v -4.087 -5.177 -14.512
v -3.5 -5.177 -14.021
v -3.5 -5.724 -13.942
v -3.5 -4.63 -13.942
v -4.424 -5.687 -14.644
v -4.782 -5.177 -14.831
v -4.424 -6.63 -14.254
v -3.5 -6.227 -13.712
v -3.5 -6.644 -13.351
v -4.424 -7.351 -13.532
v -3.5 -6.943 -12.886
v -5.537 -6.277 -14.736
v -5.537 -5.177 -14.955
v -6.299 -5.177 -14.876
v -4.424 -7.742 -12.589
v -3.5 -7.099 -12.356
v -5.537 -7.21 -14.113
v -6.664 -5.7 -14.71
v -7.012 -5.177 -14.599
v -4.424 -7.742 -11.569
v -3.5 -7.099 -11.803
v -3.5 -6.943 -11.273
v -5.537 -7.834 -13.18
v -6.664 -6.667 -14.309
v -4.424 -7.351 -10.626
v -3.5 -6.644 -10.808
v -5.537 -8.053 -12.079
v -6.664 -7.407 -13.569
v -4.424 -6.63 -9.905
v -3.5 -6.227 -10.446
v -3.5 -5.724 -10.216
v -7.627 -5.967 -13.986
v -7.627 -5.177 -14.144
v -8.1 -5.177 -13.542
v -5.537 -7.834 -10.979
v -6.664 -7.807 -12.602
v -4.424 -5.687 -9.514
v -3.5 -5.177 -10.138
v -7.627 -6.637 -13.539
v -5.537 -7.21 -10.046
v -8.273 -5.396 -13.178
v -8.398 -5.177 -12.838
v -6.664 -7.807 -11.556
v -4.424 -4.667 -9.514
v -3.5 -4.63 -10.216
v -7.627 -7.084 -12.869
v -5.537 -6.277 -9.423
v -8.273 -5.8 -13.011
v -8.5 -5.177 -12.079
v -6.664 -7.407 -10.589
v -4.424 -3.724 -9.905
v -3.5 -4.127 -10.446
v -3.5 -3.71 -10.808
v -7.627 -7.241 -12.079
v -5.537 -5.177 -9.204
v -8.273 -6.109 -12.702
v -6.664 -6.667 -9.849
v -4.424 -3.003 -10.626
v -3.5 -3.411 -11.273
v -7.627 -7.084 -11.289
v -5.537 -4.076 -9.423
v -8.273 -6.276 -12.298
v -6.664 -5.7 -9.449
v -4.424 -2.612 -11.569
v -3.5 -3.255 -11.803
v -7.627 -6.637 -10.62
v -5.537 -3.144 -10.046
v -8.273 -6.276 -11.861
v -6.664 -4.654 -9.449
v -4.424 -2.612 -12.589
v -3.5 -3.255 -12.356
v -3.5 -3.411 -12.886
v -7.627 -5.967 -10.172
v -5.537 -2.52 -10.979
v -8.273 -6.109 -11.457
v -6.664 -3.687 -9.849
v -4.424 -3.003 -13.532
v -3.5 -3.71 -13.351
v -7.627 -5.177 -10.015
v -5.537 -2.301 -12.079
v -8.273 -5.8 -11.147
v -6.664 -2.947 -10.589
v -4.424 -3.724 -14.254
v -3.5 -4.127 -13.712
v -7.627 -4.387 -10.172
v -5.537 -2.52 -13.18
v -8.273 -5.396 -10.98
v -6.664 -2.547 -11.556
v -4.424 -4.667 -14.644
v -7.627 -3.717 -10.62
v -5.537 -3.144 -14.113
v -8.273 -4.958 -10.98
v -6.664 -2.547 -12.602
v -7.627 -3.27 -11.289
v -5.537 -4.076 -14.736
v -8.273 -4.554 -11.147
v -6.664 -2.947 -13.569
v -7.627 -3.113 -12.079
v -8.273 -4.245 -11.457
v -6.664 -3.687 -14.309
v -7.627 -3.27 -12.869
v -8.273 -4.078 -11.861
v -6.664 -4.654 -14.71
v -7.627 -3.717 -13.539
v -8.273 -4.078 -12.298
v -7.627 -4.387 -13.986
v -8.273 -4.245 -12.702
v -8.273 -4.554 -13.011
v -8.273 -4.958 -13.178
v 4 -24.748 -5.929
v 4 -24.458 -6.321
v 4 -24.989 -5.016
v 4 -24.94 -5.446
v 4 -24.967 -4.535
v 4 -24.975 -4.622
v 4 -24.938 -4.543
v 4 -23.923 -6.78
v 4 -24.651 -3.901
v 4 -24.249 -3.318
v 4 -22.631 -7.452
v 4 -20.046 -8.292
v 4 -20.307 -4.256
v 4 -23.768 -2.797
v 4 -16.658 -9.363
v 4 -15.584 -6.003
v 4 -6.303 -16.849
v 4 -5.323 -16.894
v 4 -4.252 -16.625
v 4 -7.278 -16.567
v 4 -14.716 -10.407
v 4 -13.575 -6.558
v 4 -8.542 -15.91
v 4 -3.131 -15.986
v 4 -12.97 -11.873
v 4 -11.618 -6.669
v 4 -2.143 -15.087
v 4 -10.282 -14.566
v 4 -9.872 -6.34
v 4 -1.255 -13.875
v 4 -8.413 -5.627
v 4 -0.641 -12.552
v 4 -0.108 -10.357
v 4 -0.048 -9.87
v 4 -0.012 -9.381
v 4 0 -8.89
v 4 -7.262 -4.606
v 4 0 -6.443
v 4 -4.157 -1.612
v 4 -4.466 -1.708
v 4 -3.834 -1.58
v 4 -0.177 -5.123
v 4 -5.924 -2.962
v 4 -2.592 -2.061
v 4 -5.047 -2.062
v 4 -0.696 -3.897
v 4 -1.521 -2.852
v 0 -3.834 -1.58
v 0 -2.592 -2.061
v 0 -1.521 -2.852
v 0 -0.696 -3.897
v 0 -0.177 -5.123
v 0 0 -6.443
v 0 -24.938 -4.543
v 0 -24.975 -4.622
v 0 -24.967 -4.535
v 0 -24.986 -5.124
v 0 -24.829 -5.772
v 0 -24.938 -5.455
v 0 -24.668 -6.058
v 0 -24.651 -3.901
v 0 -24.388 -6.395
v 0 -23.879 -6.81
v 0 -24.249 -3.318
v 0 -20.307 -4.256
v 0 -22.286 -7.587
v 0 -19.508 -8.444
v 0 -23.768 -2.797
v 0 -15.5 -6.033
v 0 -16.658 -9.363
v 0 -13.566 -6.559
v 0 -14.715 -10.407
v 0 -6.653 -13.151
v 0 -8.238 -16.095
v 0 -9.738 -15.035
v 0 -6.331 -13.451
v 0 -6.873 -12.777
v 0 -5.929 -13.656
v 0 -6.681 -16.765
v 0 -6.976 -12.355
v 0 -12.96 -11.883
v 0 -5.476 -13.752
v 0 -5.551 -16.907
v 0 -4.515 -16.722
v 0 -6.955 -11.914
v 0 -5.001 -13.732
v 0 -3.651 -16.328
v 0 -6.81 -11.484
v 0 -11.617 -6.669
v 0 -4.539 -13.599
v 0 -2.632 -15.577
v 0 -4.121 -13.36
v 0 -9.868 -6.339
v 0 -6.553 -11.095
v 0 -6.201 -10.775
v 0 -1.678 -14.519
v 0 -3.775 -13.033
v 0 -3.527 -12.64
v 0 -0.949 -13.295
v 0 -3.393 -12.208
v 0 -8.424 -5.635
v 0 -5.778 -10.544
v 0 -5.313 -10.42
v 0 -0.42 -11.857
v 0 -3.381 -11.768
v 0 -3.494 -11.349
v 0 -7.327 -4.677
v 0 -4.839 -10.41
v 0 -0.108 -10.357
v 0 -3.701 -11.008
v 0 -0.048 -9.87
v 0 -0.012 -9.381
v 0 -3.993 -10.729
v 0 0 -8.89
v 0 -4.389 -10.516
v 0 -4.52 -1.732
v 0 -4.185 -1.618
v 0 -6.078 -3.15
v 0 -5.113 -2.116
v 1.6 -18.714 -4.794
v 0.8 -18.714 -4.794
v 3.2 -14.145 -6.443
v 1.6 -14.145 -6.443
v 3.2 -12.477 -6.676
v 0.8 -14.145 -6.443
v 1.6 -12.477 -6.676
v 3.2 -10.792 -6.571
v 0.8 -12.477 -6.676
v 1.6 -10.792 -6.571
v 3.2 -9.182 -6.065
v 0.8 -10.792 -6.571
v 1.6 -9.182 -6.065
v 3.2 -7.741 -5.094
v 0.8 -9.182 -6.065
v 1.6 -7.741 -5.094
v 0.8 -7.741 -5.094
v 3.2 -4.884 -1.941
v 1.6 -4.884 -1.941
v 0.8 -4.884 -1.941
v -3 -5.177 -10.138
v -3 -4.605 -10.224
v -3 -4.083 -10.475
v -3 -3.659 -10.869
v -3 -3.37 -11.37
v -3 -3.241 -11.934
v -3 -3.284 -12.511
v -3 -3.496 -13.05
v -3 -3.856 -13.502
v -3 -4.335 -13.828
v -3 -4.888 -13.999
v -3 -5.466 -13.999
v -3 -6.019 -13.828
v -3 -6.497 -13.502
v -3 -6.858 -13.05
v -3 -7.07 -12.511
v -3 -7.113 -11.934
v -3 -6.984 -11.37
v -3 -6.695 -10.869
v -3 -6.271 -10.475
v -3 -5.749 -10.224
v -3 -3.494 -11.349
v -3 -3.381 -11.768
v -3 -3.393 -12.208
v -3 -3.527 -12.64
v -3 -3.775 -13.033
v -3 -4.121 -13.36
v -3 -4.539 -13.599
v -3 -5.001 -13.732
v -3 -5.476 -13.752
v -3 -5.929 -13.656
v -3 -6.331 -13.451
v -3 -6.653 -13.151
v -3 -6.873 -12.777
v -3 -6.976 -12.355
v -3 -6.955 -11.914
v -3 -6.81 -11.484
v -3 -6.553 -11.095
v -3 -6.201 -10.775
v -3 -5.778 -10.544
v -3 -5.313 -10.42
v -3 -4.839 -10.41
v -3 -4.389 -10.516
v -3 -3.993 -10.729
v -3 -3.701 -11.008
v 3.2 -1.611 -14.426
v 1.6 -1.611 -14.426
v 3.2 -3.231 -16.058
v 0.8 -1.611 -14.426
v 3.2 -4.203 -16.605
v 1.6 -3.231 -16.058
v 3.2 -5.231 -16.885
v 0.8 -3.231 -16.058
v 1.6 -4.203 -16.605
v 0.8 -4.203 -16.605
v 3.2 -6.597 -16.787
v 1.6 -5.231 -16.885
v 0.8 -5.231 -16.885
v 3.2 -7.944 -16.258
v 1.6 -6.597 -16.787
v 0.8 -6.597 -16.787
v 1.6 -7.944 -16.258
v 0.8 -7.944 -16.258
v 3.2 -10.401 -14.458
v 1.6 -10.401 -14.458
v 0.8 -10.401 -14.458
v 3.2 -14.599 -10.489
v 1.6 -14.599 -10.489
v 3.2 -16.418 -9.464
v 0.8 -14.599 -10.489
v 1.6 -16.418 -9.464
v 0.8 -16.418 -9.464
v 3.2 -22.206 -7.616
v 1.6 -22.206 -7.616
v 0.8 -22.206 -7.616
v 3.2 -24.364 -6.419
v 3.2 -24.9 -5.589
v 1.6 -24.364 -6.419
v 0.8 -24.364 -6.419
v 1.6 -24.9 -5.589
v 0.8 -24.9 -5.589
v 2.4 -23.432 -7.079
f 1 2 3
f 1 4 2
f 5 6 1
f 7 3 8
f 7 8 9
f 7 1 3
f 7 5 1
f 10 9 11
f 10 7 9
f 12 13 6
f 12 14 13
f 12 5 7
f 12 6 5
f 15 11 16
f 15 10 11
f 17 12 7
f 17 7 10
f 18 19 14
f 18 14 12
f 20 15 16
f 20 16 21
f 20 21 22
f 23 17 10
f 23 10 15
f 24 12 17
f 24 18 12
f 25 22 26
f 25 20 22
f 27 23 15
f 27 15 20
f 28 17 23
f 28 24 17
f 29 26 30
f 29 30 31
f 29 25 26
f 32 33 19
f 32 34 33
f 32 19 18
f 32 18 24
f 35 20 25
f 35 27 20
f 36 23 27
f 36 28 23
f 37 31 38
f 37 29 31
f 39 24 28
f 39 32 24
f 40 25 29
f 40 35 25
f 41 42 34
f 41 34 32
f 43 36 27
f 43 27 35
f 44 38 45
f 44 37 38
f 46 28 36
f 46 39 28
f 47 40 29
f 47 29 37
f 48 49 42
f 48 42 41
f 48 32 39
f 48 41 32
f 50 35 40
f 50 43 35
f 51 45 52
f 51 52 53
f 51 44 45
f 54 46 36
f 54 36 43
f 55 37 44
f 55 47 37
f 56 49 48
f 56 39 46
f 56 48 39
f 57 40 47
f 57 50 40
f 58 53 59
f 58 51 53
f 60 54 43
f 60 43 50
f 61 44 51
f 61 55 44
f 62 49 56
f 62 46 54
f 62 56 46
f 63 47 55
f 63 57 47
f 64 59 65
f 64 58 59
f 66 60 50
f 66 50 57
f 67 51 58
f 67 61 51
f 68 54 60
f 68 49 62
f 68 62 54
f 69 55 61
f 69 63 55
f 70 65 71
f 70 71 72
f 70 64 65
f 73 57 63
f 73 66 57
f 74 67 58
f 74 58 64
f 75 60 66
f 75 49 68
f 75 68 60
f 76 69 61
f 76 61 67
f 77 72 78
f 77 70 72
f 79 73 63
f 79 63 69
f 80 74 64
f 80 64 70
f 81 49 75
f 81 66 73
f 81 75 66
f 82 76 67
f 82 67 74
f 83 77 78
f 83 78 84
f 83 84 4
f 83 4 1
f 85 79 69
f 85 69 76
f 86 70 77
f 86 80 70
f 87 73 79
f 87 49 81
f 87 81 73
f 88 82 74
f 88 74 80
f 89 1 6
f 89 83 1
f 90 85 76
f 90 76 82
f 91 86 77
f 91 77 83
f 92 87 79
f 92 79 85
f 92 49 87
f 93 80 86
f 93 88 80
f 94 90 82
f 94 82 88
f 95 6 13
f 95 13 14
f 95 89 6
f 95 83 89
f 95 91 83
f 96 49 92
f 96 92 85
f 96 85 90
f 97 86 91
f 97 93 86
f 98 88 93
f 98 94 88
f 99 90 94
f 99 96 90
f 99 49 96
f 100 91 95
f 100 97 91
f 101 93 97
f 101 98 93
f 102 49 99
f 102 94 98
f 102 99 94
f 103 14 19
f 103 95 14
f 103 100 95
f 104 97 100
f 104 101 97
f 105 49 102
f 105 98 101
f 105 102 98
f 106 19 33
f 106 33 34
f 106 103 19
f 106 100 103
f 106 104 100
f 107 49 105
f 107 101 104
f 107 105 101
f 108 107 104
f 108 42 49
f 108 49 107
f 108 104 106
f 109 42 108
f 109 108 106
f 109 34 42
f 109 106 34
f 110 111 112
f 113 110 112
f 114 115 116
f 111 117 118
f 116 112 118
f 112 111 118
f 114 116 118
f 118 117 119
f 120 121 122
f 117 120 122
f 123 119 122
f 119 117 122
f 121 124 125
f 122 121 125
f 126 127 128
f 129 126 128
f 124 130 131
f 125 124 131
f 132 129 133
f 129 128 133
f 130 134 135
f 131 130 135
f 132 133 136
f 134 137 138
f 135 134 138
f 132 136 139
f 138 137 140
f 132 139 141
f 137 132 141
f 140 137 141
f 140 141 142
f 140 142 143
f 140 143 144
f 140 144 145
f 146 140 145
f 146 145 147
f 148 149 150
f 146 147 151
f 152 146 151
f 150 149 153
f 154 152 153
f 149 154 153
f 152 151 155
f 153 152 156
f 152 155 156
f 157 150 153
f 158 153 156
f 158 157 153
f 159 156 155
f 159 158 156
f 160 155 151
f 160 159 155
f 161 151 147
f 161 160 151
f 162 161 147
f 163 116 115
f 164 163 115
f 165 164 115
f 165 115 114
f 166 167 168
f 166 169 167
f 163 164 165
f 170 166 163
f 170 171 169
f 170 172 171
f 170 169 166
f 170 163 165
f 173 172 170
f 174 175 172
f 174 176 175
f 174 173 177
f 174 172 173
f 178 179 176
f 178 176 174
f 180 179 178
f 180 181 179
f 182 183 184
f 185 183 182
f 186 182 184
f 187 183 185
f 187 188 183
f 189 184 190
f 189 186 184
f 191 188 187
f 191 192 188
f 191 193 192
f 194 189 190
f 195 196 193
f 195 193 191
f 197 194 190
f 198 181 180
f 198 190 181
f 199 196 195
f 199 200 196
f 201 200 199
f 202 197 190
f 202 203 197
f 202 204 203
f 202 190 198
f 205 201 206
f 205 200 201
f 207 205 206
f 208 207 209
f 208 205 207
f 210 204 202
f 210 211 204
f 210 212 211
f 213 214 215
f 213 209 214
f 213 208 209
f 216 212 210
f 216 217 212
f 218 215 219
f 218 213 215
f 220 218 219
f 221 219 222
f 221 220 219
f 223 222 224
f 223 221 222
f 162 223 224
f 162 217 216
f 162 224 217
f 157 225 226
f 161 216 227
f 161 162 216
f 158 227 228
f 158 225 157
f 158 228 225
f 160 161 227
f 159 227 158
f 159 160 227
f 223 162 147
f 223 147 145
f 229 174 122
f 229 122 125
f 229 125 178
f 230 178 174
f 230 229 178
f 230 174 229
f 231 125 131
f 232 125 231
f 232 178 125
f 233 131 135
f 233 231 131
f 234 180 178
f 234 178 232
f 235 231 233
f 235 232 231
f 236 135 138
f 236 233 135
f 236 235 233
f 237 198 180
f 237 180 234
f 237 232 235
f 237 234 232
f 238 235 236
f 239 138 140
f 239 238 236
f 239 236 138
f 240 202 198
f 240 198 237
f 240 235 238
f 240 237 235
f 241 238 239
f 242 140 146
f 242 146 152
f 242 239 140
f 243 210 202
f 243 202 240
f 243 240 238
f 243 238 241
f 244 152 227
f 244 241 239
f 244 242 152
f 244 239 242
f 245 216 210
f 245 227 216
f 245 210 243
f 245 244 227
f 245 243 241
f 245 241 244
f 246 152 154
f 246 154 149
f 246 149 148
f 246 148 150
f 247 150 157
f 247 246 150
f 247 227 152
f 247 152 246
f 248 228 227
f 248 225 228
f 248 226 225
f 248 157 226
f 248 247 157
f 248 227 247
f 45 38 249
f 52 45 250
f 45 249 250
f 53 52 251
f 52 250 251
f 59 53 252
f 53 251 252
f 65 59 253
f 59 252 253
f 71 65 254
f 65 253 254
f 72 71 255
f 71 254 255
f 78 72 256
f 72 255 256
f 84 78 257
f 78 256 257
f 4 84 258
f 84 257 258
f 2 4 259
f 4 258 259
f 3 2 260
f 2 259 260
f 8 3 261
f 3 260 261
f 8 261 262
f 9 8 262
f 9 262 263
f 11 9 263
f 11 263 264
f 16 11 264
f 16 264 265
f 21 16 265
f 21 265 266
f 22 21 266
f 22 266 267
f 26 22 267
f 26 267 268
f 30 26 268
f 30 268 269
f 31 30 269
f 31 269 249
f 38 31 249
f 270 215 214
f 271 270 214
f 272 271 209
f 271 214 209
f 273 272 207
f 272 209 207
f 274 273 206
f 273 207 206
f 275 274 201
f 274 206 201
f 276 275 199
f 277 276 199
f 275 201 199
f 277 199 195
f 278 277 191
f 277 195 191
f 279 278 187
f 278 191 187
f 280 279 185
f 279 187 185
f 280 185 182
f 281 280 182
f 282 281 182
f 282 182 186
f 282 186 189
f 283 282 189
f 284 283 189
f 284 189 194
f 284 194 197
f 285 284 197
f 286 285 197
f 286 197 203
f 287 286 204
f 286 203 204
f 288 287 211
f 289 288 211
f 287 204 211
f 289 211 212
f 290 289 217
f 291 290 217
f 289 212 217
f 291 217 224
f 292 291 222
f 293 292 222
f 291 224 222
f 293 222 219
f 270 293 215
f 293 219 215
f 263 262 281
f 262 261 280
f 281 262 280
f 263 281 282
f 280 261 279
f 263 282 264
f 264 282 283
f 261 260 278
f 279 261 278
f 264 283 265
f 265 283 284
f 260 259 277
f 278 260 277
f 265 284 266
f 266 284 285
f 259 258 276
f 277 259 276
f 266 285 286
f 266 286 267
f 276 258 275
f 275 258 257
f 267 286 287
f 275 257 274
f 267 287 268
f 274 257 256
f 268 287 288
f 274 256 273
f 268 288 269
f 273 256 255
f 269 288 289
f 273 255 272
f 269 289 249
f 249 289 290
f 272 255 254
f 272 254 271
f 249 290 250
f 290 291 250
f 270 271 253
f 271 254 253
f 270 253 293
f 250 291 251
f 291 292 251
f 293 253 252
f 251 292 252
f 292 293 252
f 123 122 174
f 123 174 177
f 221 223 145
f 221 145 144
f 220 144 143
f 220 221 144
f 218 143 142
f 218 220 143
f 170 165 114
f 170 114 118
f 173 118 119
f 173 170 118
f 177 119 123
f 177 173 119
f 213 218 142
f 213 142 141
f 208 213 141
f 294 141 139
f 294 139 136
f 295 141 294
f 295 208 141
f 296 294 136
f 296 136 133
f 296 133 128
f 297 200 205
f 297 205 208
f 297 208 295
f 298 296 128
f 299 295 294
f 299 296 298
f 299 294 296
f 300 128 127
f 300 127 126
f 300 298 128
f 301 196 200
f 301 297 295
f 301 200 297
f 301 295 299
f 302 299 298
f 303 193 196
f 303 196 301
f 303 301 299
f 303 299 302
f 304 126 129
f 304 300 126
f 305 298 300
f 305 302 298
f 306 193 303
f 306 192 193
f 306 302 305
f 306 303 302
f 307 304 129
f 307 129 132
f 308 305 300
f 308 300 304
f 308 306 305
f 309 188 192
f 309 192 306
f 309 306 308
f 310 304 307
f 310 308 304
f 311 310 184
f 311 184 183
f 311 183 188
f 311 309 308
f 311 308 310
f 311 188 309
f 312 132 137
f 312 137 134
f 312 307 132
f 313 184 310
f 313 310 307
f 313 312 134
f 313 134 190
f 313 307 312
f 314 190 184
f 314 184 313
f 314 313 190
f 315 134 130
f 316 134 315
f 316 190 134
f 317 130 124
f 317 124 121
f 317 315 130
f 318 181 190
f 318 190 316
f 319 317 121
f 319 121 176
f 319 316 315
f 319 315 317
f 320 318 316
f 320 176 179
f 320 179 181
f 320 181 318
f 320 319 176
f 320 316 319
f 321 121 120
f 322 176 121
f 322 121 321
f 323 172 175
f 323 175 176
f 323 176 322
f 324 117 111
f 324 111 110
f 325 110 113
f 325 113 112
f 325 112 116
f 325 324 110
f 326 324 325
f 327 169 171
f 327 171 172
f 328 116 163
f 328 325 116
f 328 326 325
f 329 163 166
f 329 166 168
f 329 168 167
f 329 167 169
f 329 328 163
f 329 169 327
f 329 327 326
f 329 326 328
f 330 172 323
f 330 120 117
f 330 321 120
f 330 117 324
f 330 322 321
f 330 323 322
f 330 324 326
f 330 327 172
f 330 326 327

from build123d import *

# Parameters (mm, degrees)
BOSS_EXTRUDE1_DEPTH = 4
CUT_EXTRUDE3_START  = -10
CUT_EXTRUDE3_DEPTH  = 10
CUT_EXTRUDE4_DEPTH  = 10
FILLET4_START       = -1
FILLET4_DEPTH       = 6
SKETCH7_RX          = 1.83432271
SKETCH7_RY          = 1.648181576
BOSS_EXTRUDE2_DEPTH = 3
SKETCH8_R           = 1.941403724
BOSS_EXTRUDE3_DEPTH = 0.5
DOME1_FACE_RADIUS   = 1.941403724
DOME1_HEIGHT        = 5
CUT_EXTRUDE5_DEPTH  = 5


with BuildPart() as part:
    # Sketch1 → Boss-Extrude1 (new body)
    with BuildSketch(Plane(origin=(0, 0, 0), x_dir=(0, 0, -1), z_dir=(1, 0, 0))):
        with BuildLine():
            Line((6.442518848, 0), (13.409619329, 0))
            ThreePointArc((13.409619329, 0), (16.945153235, -1.464466094), (18.409619329, -5))
            Line((18.409619329, -5), (18.409619329, -20.34540211))
            ThreePointArc((18.409619329, -20.34540211), (16.945153235, -23.880936016), (13.409619329, -25.34540211))
            Line((13.409619329, -25.34540211), (6.442518848, -25.34540211))
            ThreePointArc((6.442518848, -25.34540211), (2.906984942, -23.880936016), (1.442518848, -20.34540211))
            Line((1.442518848, -20.34540211), (1.442518848, -5))
            ThreePointArc((1.442518848, -5), (2.906984942, -1.464466094), (6.442518848, 0))
        make_face()
    extrude(amount=BOSS_EXTRUDE1_DEPTH)

    # Sketch2 → Cut-Extrude3 (cut)
    with BuildSketch(Plane(origin=(4, 0, 0), x_dir=(0, 0, -1), z_dir=(1, 0, 0)).offset(CUT_EXTRUDE3_START)):
        with BuildLine():
            add(Edge.make_bspline(
                [(2.42884403, -23.286077848), (2.370716158, -22.573896831), (4.185530255, -21.12926271), (4.874517164, -17.962112227), (7.118988975, -13.802662727), (6.544049448, -7.530329658), (1.569055746, -5.349803368), (1.58046752, -3.833613753)],
                knots=[0.531334438, 0.531334438, 0.531334438, 0.531334438, 0.570400737, 0.608236932, 0.680812242, 0.778589658, 0.857107486, 0.857107486, 0.857107486, 0.857107486], degree=3))
            ThreePointArc((1.58046752, -3.833613753), (1.47712578, -4.412742239), (1.442518848, -5))
            Line((1.442518848, -5), (1.442518848, -20.34540211))
            ThreePointArc((1.442518848, -20.34540211), (1.683757797, -21.87974016), (2.384196149, -23.266021372))
            add(Edge.make_bspline(
                [(2.384196149, -23.266021372), (2.399070873, -23.272759012), (2.413953527, -23.279444568), (2.428844038, -23.286077844)],
                knots=[0.998981394, 0.998981394, 0.998981394, 0.998981394, 0.999513034, 0.999513034, 0.999513034, 0.999513034], degree=3))
        make_face()
        with BuildLine():
            Line((13.409619329, 0), (9.46398266, 0))
            add(Edge.make_bspline(
                [(9.46398266, 0), (11.207503001, -0.168664697), (14.40943711, -0.885845558), (18.093070912, -5.600973008), (14.034927819, -11.50687924), (8.23474836, -15.211494887), (7.662204752, -25.591568315), (4.542739971, -24.937885151)],
                knots=[0, 0, 0, 0, 0.077946221, 0.143334379, 0.228662798, 0.345497184, 0.490655992, 0.490655992, 0.490655992, 0.490655992], degree=3))
            add(Edge.make_bspline(
                [(4.54273997, -24.937885153), (5.749127141, -25.532851997), (7.208451258, -25.09277451), (8.521498661, -25.334156754), (8.57622256, -25.34540211)],
                knots=[0.001400322, 0.001400322, 0.001400322, 0.001400322, 0.038459748, 0.040079073, 0.040079073, 0.040079073, 0.040079073], degree=3))
            Line((8.57622256, -25.34540211), (13.409619329, -25.34540211))
            ThreePointArc((13.409619329, -25.34540211), (16.945153235, -23.880936016), (18.409619329, -20.34540211))
            Line((18.409619329, -20.34540211), (18.409619329, -5))
            ThreePointArc((18.409619329, -5), (16.945153235, -1.464466094), (13.409619329, 0))
        make_face()
        with BuildLine():
            ThreePointArc((2.906984942, -1.464466094), (4.529101686, -0.380602337), (6.442518848, 0))
            add(Edge.make_bspline(
                [(6.442518848, 0), (7.443592251, 0.121124965), (8.454170968, 0.097687179), (9.46398266, 0)],
                knots=[0.954855127, 0.954855127, 0.954855127, 0.954855127, 1, 1, 1, 1], degree=3))
            Line((9.46398266, 0), (13.409619329, 0))
            ThreePointArc((13.409619329, 0), (16.945153235, -1.464466094), (18.409619329, -5))
            Line((18.409619329, -5), (18.409619329, -20.34540211))
            ThreePointArc((18.409619329, -20.34540211), (16.945153235, -23.880936016), (13.409619329, -25.34540211))
            Line((13.409619329, -25.34540211), (8.57622256, -25.34540211))
            add(Edge.make_bspline(
                [(8.57622256, -25.34540211), (10.509849295, -25.742748085), (21.004932545, -37.507061135), (40.108036136, 7.046689321), (11.067178354, 5.045725954), (-13.182357735, 4.105959789), (-4.736766595, -20.04051671), (2.384196149, -23.266021372)],
                knots=[0.040079073, 0.040079073, 0.040079073, 0.040079073, 0.09729665, 0.409886449, 0.593670055, 0.744469586, 0.998981394, 0.998981394, 0.998981394, 0.998981394], degree=3))
            ThreePointArc((2.384196149, -23.266021372), (1.683757797, -21.87974016), (1.442518848, -20.34540211))
            Line((1.442518848, -20.34540211), (1.442518848, -5))
            ThreePointArc((1.442518848, -5), (1.47712578, -4.412742239), (1.58046752, -3.833613753))
            add(Edge.make_bspline(
                [(1.58046752, -3.833613753), (1.586363874, -3.050213083), (2.186842654, -2.121305338), (2.906984942, -1.464466094)],
                knots=[0.857107486, 0.857107486, 0.857107486, 0.857107486, 0.897676897, 0.897676897, 0.897676897, 0.897676897], degree=3))
        make_face()
    extrude(amount=CUT_EXTRUDE3_DEPTH, mode=Mode.SUBTRACT)

    # Sketch6 → Cut-Extrude4 (cut)
    with BuildSketch(Plane(origin=(4, 0, 0), x_dir=(0, 0, -1), z_dir=(1, 0, 0))):
        with BuildLine():
            add(Edge.make_bspline(
                [(6.876629539, -24.646378986), (6.348652857, -24.697603605), (5.705170416, -25.181041107), (2.967179599, -24.643973727), (6.798679283, -26.524715176), (10.198220508, -25.437781208), (7.742791771, -24.562343399), (6.876629539, -24.646378986)],
                knots=[0, 0, 0, 0, 0.142115473, 0.262842986, 0.576183637, 0.76685513, 1, 1, 1, 1], degree=3))
        make_face()
    extrude(amount=-CUT_EXTRUDE4_DEPTH, mode=Mode.SUBTRACT)

    # Fillet4: read off the stored shape, not the designer's step
    # Fillet4 outline → Fillet4 (cut)
    with BuildSketch(Plane.YZ.offset(FILLET4_START)):
        with BuildLine():
            ThreePointArc((0, -8.890200058), (-0.027061887, -9.625390775), (-0.108101078, -10.356602363))
            add(Edge.make_bspline(
                [(0, -9.46398266), (-0.028832047, -9.762025236), (-0.064132076, -10.060000995), (-0.108101078, -10.356602363)],
                knots=[0, 0, 0, 0, 0.01332436, 0.01332436, 0.01332436, 0.01332436], degree=3))
            Line((0, -9.46398266), (0, -8.890200058))
        make_face()
    extrude(amount=FILLET4_DEPTH, mode=Mode.SUBTRACT)

    # Sketch7 → Boss-Extrude2 (add)
    with BuildSketch(Plane.ZY):
        with Locations(Location((-12.079238976, -5.176946967), (0, 0, 66.52385958))):
            Ellipse(SKETCH7_RX, SKETCH7_RY)
    extrude(amount=BOSS_EXTRUDE2_DEPTH)

    # Sketch8 → Boss-Extrude3 (add)
    with BuildSketch(Plane.ZY.offset(3)):
        with Locations((-12.079238976, -5.176946967)):
            Circle(SKETCH8_R)
    extrude(amount=BOSS_EXTRUDE3_DEPTH)

    # Dome1: a dome of height H over a round flat face of radius A is a cap of a sphere of radius (A * A + H * H) / (2 * H)
    dome1_r = (DOME1_FACE_RADIUS * DOME1_FACE_RADIUS + DOME1_HEIGHT * DOME1_HEIGHT) / (2 * DOME1_HEIGHT)
    dome1_base = Plane((-3.5, -5.176946967, -12.079238976), z_dir=(-1, 0, 0))
    with Locations(dome1_base.offset(DOME1_HEIGHT - dome1_r)):
        dome1_ball = Sphere(dome1_r, mode=Mode.PRIVATE)
    add(split(dome1_ball, bisect_by=dome1_base, keep=Keep.TOP, mode=Mode.PRIVATE))

    # Sketch9 → Cut-Extrude5 (cut)
    with BuildSketch(Plane.ZY):
        with BuildLine():
            Line((-4.325838527, -20.140987675), (-2.486204677, -24.505449301))
            add(Edge.make_bspline(
                [(-2.486204677, -24.505449301), (3.73593799, -24.171685926), (-2.121854058, -16.126748366), (-4.325838527, -20.140987675)],
                knots=[0, 0, 0, 0, 1, 1, 1, 1], degree=3))
        make_face()
    extrude(amount=-CUT_EXTRUDE5_DEPTH, mode=Mode.SUBTRACT)


solid = part.part
